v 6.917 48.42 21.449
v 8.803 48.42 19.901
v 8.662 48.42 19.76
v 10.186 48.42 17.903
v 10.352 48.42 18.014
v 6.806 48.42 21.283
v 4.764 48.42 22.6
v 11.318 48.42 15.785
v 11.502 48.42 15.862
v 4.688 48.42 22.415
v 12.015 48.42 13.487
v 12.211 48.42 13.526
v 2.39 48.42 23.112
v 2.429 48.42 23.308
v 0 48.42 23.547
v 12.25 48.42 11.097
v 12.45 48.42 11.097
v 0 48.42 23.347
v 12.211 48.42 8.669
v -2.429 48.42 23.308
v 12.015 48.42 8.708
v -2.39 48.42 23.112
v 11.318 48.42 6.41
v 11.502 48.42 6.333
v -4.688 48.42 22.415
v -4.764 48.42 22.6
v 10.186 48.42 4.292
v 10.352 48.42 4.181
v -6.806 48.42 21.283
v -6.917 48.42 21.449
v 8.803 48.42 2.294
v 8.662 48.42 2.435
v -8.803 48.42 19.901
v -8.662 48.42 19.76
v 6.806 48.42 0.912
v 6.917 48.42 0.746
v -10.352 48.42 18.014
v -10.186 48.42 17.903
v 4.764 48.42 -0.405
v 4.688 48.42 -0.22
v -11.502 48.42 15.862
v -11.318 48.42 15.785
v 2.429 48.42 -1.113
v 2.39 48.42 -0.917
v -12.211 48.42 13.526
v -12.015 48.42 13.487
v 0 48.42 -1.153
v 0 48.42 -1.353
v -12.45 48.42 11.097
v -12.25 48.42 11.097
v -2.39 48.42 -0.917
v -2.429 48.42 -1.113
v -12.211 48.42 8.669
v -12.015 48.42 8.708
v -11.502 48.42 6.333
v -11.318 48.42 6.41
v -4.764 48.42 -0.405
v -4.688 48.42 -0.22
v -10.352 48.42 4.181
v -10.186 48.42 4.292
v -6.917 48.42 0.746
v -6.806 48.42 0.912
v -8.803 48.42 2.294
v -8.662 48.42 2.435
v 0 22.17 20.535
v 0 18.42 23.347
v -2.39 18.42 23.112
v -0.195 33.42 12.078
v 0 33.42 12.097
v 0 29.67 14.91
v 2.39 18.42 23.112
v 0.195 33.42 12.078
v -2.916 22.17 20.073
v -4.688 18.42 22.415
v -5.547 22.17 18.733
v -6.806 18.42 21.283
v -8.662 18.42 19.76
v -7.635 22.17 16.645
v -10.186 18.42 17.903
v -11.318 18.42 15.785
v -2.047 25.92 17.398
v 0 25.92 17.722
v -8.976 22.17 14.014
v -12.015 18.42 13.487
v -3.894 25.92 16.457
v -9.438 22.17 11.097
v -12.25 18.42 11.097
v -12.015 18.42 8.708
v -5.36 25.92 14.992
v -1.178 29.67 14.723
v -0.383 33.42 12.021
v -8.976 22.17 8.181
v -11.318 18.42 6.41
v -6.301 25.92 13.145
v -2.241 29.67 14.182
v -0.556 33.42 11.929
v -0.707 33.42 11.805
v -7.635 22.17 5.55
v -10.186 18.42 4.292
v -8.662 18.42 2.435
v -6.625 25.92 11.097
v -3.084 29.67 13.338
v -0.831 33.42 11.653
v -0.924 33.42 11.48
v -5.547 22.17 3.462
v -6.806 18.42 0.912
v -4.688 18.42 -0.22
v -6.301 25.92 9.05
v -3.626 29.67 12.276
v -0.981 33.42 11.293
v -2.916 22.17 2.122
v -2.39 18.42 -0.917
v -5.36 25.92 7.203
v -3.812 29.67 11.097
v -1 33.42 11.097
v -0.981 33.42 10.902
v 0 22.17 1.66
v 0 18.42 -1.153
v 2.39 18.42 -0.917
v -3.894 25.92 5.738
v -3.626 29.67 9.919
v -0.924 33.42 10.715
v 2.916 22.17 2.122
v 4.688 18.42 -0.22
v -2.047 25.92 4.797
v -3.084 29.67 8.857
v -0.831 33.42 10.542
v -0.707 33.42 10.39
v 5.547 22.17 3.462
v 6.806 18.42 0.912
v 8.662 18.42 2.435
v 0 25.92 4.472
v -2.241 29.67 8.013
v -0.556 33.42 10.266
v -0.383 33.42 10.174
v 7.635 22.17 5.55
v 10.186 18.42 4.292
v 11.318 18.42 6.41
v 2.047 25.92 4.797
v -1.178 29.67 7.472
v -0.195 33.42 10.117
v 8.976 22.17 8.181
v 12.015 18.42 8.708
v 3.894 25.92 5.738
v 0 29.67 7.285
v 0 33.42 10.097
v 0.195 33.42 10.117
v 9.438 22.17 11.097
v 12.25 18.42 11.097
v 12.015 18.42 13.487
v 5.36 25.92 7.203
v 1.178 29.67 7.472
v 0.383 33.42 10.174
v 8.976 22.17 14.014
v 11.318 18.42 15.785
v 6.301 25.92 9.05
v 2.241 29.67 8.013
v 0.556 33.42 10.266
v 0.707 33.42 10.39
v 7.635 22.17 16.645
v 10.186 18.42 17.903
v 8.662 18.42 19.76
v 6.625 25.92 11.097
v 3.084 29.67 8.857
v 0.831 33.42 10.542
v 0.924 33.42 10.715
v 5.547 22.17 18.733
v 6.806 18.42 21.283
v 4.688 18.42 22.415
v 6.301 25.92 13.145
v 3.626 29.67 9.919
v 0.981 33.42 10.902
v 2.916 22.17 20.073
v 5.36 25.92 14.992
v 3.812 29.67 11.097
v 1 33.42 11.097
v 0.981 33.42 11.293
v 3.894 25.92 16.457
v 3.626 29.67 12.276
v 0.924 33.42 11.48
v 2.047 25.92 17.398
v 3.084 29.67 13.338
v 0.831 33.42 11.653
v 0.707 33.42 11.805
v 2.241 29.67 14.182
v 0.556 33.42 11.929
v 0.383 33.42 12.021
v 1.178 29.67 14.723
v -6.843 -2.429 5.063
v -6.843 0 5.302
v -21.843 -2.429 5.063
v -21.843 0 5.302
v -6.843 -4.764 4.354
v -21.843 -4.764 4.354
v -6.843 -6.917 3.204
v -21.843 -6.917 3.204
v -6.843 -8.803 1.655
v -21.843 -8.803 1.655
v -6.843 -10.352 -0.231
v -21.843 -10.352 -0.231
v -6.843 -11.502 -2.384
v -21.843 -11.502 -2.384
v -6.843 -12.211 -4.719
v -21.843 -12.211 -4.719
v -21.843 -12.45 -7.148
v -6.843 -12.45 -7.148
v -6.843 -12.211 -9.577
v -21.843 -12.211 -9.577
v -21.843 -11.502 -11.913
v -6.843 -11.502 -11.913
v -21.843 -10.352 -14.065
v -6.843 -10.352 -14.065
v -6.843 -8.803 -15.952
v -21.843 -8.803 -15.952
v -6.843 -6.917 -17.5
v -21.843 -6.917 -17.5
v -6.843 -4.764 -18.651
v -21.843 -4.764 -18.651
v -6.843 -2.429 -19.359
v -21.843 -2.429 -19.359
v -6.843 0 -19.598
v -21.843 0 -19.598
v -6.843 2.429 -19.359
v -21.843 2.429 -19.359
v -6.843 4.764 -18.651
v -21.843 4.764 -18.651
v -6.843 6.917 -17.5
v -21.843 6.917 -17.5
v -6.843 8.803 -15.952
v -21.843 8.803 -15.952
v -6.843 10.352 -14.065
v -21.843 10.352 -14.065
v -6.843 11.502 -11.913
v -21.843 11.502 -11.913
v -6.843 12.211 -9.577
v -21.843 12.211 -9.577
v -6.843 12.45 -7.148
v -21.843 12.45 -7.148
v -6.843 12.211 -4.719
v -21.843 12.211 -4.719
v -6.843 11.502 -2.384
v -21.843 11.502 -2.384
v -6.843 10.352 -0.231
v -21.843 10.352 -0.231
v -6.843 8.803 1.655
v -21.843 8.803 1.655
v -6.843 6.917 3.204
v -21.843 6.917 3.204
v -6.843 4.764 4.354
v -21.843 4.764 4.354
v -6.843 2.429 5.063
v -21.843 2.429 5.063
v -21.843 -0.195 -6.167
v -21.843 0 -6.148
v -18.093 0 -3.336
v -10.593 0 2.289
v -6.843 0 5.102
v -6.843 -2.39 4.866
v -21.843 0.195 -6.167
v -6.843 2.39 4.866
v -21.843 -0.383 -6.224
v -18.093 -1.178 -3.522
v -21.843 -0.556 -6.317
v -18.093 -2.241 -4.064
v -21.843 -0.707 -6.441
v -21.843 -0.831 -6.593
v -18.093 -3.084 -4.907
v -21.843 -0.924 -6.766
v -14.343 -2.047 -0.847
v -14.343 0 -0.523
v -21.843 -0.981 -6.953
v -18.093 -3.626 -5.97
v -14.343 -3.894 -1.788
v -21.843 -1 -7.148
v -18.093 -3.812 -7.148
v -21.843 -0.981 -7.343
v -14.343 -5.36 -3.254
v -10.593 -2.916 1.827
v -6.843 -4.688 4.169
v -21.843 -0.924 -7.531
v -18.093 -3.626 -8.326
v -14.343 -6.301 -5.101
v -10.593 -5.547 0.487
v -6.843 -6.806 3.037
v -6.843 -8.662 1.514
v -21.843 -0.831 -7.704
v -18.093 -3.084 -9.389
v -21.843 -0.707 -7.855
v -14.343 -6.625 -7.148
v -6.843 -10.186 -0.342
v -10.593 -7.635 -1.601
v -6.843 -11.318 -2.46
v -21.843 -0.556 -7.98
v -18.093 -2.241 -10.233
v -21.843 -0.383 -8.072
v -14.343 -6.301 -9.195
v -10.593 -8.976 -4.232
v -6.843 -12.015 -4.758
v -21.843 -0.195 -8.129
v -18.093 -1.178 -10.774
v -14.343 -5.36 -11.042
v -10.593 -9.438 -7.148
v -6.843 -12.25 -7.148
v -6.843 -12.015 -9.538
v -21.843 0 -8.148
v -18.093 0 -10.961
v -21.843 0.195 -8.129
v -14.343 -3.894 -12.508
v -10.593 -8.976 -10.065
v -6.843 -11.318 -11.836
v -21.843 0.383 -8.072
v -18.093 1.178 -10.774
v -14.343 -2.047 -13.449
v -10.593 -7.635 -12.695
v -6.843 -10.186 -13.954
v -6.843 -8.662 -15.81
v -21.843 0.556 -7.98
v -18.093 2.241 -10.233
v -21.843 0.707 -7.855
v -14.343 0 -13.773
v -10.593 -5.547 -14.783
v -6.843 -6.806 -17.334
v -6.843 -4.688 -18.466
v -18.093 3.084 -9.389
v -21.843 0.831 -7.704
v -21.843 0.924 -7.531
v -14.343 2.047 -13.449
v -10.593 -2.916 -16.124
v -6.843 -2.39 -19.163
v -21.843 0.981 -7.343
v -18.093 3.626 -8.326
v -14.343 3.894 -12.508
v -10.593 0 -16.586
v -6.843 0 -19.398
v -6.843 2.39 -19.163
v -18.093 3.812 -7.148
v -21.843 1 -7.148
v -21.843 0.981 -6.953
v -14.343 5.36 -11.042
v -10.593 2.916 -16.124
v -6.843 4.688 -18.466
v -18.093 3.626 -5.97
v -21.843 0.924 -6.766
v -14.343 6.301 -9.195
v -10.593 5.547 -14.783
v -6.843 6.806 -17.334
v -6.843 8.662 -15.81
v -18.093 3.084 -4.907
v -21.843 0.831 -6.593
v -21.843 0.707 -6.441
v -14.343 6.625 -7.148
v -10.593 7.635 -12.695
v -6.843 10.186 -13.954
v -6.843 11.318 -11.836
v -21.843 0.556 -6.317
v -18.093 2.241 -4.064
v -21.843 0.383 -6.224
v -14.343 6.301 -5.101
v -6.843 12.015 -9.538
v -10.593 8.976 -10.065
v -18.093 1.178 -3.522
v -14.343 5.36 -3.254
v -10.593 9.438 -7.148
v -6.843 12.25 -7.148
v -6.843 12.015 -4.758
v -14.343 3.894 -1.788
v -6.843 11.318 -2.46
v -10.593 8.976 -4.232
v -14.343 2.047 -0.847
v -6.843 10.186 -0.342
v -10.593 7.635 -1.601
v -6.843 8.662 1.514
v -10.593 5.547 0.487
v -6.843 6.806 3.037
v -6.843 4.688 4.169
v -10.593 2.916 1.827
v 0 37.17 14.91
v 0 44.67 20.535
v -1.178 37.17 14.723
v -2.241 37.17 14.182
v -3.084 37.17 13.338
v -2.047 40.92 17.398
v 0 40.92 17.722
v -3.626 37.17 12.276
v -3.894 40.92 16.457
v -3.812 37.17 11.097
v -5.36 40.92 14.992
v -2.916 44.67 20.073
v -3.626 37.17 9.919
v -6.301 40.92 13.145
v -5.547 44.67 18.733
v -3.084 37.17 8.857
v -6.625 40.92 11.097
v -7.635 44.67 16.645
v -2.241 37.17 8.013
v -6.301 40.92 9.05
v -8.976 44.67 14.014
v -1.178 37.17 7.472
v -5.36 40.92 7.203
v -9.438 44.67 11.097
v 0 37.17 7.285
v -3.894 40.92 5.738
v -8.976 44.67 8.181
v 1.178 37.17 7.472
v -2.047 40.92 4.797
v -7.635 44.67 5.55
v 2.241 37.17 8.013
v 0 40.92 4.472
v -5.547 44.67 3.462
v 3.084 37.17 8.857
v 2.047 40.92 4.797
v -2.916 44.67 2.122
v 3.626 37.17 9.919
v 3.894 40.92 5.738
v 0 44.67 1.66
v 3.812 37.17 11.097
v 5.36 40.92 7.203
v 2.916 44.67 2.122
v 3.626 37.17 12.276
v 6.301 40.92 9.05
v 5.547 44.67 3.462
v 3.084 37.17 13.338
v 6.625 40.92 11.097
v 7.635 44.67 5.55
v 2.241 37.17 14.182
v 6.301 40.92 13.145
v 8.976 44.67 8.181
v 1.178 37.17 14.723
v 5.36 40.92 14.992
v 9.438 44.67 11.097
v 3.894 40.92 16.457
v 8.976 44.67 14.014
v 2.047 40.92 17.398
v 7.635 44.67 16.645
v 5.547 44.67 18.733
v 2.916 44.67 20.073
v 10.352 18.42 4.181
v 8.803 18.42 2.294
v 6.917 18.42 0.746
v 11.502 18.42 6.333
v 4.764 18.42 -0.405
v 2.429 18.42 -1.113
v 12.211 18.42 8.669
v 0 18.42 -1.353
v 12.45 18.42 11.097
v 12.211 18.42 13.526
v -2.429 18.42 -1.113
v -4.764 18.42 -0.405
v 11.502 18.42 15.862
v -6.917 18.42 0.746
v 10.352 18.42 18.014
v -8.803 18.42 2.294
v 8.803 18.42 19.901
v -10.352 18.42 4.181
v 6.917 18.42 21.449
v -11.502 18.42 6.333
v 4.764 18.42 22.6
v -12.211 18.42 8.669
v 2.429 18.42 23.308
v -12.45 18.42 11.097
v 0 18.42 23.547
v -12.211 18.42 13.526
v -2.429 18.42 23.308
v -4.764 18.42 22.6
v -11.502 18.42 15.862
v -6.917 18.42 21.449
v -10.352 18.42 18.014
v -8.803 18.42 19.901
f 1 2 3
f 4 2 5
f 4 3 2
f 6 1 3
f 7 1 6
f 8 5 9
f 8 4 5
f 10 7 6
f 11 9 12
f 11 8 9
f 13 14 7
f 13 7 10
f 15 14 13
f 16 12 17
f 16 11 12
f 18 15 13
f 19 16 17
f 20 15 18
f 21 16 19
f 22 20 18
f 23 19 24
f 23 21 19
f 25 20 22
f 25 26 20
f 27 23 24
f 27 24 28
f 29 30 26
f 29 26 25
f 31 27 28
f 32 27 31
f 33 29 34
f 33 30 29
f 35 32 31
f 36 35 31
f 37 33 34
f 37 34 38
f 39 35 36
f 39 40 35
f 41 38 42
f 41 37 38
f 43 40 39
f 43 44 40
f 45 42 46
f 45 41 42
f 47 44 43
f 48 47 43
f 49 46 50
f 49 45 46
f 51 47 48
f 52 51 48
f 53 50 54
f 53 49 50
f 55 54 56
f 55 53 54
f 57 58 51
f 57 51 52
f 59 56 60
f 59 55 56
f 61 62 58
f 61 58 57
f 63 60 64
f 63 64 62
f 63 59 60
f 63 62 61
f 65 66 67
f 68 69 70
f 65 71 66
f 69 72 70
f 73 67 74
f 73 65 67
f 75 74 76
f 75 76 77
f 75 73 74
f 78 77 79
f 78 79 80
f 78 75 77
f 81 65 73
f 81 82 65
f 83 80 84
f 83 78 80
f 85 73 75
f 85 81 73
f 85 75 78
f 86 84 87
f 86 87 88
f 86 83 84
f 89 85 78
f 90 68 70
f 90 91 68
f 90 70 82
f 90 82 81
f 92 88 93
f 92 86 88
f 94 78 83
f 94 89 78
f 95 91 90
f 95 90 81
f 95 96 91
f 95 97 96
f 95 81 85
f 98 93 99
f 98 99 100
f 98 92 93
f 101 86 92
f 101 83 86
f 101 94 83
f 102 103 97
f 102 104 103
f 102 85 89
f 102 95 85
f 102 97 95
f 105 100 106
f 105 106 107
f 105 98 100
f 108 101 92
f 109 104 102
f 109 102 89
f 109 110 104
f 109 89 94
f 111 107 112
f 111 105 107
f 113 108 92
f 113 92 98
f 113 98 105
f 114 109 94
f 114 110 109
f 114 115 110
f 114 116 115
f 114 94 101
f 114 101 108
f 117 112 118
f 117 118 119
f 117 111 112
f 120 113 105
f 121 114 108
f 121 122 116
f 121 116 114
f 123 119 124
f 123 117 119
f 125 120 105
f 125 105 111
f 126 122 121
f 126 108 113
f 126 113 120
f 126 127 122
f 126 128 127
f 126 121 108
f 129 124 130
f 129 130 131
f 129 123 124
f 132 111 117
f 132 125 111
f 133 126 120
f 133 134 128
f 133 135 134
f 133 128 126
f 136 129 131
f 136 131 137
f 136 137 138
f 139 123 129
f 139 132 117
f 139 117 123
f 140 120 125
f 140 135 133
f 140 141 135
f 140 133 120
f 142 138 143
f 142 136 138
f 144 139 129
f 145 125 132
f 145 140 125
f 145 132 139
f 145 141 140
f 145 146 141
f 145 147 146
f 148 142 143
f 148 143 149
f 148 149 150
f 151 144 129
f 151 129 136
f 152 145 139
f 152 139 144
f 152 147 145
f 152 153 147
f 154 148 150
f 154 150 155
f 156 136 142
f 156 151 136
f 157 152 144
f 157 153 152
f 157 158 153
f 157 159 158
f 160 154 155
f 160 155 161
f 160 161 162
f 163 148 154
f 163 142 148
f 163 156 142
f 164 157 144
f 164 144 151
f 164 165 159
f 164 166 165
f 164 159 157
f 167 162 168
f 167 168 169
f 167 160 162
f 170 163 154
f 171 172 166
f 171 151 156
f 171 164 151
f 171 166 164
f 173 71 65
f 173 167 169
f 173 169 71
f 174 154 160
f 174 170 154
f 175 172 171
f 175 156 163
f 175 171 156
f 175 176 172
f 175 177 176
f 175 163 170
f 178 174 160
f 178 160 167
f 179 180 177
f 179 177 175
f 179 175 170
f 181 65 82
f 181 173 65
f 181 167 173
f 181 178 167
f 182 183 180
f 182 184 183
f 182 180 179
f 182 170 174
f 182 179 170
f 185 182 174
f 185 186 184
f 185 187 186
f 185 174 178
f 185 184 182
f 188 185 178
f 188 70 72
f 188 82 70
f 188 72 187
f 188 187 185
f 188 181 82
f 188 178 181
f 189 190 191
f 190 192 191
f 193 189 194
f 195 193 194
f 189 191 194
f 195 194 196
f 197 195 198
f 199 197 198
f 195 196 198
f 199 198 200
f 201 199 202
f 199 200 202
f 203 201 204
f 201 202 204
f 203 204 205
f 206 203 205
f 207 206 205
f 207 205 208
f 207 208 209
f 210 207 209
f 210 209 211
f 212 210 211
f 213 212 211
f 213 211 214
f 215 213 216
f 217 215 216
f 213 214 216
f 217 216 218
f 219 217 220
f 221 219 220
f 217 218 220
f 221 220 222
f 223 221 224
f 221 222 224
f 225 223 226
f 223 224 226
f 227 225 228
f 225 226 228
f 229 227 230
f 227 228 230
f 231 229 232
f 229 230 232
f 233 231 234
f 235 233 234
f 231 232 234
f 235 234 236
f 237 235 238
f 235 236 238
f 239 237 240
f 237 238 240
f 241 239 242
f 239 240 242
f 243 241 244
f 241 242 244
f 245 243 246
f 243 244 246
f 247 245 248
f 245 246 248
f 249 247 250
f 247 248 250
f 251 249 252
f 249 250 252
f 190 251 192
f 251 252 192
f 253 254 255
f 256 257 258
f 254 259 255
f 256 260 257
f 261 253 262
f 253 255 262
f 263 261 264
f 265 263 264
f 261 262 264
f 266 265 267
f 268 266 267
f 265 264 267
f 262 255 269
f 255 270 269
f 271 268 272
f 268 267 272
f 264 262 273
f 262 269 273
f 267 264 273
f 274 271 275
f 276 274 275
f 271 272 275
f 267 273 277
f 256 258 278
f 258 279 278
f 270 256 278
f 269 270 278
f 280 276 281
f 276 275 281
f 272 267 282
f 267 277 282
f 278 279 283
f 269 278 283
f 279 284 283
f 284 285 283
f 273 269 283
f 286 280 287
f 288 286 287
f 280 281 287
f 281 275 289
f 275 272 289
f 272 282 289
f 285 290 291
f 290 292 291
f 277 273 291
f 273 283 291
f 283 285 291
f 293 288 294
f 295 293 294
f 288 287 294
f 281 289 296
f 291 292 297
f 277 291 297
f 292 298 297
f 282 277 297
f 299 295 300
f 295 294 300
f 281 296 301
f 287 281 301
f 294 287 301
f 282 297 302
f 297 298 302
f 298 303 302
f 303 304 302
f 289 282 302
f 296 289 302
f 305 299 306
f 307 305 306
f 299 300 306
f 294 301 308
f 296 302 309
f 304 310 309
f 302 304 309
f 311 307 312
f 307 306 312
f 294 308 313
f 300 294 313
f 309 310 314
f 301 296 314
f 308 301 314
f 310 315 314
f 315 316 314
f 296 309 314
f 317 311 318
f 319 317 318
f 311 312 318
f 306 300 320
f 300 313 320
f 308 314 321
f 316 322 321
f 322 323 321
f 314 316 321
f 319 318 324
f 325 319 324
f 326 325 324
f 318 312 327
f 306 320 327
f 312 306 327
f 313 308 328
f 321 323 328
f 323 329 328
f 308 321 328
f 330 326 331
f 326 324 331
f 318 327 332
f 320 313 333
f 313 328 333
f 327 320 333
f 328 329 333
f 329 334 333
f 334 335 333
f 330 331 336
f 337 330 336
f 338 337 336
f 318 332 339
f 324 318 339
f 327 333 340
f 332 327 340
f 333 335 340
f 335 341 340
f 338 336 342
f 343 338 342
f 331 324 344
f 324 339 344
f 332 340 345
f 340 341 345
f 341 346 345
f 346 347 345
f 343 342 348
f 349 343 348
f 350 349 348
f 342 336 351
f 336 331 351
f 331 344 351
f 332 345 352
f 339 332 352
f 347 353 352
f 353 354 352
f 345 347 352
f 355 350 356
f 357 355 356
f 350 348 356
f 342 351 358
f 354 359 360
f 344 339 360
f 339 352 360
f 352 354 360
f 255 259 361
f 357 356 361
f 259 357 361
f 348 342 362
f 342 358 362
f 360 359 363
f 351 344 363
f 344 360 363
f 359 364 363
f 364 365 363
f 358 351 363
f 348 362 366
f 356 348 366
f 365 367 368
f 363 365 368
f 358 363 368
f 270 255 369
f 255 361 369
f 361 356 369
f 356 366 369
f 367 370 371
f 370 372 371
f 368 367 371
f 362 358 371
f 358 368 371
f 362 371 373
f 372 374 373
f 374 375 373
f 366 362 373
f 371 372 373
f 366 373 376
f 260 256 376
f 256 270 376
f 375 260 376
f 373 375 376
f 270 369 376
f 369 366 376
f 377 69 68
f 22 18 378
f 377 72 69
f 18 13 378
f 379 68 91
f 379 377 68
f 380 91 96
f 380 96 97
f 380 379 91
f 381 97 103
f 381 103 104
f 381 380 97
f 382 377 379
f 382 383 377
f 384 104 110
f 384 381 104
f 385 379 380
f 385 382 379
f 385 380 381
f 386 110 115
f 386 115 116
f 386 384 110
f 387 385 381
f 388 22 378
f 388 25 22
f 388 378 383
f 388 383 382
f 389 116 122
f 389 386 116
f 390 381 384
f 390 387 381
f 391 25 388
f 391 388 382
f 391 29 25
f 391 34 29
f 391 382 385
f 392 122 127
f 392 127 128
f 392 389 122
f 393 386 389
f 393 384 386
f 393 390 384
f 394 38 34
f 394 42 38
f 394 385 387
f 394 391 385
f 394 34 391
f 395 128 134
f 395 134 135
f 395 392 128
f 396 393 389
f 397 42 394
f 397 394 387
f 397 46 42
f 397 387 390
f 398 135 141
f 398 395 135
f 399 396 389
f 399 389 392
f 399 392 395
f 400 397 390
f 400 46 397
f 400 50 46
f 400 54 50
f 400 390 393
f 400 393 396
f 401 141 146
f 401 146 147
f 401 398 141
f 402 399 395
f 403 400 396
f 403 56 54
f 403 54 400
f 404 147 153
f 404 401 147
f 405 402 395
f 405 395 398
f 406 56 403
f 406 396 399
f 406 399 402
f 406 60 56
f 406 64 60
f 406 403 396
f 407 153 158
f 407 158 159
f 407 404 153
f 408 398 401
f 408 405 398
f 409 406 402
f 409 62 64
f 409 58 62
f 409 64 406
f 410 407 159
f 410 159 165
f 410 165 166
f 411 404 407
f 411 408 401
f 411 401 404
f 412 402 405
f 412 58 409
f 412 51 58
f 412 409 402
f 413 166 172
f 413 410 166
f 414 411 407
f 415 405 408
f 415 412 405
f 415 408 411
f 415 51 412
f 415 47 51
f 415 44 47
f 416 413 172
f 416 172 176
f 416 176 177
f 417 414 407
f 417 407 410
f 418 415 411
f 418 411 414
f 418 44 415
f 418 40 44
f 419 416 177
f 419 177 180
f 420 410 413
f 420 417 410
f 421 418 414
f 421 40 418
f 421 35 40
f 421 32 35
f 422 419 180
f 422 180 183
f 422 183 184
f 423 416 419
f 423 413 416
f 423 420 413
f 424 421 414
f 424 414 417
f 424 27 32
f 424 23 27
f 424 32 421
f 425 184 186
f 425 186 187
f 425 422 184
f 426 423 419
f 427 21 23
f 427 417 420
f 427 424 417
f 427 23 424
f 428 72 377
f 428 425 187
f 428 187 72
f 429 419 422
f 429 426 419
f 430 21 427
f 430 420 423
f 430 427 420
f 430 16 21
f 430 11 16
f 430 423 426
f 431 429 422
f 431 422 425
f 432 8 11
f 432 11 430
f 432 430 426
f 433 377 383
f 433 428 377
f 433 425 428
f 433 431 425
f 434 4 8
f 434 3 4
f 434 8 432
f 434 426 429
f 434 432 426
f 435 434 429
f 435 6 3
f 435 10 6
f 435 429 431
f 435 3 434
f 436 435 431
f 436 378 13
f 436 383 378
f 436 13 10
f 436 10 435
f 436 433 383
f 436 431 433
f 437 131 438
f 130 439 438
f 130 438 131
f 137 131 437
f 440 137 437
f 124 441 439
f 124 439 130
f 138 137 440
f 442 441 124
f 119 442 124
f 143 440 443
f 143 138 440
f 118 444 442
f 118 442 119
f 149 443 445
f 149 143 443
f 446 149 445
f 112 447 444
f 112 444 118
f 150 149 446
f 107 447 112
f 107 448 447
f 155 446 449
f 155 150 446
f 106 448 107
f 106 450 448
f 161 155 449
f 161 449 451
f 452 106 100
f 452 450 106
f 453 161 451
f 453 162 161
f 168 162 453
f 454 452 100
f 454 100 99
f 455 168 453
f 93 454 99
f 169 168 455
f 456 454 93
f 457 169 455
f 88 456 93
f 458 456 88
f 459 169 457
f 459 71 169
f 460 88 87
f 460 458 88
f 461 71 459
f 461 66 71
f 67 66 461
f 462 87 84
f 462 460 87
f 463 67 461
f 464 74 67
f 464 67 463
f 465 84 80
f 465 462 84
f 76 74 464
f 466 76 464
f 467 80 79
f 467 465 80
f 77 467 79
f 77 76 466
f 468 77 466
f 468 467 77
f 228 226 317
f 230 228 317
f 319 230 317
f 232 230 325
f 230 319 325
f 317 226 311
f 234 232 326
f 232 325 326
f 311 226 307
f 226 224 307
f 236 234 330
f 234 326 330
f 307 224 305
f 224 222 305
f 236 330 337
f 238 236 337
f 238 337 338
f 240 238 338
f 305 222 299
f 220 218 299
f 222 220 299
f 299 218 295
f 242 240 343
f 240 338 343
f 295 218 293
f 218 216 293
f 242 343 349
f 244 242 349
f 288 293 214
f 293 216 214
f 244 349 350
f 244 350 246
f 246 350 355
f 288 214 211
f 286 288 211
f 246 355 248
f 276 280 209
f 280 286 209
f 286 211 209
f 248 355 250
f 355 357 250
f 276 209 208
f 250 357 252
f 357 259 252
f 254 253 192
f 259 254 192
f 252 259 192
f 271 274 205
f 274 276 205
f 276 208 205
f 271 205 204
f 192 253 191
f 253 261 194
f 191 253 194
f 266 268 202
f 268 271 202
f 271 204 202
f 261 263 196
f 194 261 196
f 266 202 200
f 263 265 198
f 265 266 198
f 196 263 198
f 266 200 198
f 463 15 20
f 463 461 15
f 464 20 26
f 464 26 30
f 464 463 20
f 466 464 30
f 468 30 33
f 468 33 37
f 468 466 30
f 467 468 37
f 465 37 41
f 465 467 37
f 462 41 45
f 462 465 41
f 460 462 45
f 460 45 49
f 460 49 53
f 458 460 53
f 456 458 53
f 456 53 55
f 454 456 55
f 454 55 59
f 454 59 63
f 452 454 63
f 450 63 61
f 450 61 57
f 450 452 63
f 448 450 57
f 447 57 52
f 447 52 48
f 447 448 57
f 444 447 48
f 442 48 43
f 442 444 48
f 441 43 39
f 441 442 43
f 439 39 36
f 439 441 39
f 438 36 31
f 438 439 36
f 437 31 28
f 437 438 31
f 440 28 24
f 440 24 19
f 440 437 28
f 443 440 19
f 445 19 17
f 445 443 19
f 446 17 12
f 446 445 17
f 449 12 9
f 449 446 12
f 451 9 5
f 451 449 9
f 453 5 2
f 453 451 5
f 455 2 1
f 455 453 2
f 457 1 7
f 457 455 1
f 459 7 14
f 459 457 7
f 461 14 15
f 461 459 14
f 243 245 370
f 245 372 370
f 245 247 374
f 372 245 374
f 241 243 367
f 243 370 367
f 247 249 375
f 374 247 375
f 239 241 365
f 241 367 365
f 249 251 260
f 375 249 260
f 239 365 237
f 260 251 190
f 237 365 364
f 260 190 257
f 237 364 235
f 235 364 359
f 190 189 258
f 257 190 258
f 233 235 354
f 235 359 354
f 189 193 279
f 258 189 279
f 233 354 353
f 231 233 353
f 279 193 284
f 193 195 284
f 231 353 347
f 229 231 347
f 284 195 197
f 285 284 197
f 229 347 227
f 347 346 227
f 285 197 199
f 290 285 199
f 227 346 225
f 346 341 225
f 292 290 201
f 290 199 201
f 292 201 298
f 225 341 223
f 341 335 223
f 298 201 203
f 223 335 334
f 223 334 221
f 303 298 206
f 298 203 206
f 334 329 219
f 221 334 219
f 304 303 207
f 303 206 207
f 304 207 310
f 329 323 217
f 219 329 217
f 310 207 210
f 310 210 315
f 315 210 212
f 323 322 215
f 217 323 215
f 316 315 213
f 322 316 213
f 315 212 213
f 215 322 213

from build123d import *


with BuildPart() as f1:
    # F0 (on Right) → F1 (revolve)
    with BuildSketch(Plane.YZ):
        Polygon((18.420085, 23.34749), (33.420085, 12.09749), (48.420085, 23.34749), (48.420085, 23.54749), (18.420085, 23.54749), align=None)
    revolve(axis=Axis((0, 30.725388, 11.09749), (0, -1, 0)))


with BuildPart() as f3:
    # F2 (on Front) → F3 (revolve)
    with BuildSketch(Plane.XZ):
        Polygon((-6.843457, 5.301776), (-21.843457, 5.301776), (-21.843457, -6.148224), (-6.843457, 5.101776), align=None)
    revolve(axis=Axis((-15.019601, 0, -7.148224), (1, 0, 0)))


solid = Compound([f1.part, f3.part])
